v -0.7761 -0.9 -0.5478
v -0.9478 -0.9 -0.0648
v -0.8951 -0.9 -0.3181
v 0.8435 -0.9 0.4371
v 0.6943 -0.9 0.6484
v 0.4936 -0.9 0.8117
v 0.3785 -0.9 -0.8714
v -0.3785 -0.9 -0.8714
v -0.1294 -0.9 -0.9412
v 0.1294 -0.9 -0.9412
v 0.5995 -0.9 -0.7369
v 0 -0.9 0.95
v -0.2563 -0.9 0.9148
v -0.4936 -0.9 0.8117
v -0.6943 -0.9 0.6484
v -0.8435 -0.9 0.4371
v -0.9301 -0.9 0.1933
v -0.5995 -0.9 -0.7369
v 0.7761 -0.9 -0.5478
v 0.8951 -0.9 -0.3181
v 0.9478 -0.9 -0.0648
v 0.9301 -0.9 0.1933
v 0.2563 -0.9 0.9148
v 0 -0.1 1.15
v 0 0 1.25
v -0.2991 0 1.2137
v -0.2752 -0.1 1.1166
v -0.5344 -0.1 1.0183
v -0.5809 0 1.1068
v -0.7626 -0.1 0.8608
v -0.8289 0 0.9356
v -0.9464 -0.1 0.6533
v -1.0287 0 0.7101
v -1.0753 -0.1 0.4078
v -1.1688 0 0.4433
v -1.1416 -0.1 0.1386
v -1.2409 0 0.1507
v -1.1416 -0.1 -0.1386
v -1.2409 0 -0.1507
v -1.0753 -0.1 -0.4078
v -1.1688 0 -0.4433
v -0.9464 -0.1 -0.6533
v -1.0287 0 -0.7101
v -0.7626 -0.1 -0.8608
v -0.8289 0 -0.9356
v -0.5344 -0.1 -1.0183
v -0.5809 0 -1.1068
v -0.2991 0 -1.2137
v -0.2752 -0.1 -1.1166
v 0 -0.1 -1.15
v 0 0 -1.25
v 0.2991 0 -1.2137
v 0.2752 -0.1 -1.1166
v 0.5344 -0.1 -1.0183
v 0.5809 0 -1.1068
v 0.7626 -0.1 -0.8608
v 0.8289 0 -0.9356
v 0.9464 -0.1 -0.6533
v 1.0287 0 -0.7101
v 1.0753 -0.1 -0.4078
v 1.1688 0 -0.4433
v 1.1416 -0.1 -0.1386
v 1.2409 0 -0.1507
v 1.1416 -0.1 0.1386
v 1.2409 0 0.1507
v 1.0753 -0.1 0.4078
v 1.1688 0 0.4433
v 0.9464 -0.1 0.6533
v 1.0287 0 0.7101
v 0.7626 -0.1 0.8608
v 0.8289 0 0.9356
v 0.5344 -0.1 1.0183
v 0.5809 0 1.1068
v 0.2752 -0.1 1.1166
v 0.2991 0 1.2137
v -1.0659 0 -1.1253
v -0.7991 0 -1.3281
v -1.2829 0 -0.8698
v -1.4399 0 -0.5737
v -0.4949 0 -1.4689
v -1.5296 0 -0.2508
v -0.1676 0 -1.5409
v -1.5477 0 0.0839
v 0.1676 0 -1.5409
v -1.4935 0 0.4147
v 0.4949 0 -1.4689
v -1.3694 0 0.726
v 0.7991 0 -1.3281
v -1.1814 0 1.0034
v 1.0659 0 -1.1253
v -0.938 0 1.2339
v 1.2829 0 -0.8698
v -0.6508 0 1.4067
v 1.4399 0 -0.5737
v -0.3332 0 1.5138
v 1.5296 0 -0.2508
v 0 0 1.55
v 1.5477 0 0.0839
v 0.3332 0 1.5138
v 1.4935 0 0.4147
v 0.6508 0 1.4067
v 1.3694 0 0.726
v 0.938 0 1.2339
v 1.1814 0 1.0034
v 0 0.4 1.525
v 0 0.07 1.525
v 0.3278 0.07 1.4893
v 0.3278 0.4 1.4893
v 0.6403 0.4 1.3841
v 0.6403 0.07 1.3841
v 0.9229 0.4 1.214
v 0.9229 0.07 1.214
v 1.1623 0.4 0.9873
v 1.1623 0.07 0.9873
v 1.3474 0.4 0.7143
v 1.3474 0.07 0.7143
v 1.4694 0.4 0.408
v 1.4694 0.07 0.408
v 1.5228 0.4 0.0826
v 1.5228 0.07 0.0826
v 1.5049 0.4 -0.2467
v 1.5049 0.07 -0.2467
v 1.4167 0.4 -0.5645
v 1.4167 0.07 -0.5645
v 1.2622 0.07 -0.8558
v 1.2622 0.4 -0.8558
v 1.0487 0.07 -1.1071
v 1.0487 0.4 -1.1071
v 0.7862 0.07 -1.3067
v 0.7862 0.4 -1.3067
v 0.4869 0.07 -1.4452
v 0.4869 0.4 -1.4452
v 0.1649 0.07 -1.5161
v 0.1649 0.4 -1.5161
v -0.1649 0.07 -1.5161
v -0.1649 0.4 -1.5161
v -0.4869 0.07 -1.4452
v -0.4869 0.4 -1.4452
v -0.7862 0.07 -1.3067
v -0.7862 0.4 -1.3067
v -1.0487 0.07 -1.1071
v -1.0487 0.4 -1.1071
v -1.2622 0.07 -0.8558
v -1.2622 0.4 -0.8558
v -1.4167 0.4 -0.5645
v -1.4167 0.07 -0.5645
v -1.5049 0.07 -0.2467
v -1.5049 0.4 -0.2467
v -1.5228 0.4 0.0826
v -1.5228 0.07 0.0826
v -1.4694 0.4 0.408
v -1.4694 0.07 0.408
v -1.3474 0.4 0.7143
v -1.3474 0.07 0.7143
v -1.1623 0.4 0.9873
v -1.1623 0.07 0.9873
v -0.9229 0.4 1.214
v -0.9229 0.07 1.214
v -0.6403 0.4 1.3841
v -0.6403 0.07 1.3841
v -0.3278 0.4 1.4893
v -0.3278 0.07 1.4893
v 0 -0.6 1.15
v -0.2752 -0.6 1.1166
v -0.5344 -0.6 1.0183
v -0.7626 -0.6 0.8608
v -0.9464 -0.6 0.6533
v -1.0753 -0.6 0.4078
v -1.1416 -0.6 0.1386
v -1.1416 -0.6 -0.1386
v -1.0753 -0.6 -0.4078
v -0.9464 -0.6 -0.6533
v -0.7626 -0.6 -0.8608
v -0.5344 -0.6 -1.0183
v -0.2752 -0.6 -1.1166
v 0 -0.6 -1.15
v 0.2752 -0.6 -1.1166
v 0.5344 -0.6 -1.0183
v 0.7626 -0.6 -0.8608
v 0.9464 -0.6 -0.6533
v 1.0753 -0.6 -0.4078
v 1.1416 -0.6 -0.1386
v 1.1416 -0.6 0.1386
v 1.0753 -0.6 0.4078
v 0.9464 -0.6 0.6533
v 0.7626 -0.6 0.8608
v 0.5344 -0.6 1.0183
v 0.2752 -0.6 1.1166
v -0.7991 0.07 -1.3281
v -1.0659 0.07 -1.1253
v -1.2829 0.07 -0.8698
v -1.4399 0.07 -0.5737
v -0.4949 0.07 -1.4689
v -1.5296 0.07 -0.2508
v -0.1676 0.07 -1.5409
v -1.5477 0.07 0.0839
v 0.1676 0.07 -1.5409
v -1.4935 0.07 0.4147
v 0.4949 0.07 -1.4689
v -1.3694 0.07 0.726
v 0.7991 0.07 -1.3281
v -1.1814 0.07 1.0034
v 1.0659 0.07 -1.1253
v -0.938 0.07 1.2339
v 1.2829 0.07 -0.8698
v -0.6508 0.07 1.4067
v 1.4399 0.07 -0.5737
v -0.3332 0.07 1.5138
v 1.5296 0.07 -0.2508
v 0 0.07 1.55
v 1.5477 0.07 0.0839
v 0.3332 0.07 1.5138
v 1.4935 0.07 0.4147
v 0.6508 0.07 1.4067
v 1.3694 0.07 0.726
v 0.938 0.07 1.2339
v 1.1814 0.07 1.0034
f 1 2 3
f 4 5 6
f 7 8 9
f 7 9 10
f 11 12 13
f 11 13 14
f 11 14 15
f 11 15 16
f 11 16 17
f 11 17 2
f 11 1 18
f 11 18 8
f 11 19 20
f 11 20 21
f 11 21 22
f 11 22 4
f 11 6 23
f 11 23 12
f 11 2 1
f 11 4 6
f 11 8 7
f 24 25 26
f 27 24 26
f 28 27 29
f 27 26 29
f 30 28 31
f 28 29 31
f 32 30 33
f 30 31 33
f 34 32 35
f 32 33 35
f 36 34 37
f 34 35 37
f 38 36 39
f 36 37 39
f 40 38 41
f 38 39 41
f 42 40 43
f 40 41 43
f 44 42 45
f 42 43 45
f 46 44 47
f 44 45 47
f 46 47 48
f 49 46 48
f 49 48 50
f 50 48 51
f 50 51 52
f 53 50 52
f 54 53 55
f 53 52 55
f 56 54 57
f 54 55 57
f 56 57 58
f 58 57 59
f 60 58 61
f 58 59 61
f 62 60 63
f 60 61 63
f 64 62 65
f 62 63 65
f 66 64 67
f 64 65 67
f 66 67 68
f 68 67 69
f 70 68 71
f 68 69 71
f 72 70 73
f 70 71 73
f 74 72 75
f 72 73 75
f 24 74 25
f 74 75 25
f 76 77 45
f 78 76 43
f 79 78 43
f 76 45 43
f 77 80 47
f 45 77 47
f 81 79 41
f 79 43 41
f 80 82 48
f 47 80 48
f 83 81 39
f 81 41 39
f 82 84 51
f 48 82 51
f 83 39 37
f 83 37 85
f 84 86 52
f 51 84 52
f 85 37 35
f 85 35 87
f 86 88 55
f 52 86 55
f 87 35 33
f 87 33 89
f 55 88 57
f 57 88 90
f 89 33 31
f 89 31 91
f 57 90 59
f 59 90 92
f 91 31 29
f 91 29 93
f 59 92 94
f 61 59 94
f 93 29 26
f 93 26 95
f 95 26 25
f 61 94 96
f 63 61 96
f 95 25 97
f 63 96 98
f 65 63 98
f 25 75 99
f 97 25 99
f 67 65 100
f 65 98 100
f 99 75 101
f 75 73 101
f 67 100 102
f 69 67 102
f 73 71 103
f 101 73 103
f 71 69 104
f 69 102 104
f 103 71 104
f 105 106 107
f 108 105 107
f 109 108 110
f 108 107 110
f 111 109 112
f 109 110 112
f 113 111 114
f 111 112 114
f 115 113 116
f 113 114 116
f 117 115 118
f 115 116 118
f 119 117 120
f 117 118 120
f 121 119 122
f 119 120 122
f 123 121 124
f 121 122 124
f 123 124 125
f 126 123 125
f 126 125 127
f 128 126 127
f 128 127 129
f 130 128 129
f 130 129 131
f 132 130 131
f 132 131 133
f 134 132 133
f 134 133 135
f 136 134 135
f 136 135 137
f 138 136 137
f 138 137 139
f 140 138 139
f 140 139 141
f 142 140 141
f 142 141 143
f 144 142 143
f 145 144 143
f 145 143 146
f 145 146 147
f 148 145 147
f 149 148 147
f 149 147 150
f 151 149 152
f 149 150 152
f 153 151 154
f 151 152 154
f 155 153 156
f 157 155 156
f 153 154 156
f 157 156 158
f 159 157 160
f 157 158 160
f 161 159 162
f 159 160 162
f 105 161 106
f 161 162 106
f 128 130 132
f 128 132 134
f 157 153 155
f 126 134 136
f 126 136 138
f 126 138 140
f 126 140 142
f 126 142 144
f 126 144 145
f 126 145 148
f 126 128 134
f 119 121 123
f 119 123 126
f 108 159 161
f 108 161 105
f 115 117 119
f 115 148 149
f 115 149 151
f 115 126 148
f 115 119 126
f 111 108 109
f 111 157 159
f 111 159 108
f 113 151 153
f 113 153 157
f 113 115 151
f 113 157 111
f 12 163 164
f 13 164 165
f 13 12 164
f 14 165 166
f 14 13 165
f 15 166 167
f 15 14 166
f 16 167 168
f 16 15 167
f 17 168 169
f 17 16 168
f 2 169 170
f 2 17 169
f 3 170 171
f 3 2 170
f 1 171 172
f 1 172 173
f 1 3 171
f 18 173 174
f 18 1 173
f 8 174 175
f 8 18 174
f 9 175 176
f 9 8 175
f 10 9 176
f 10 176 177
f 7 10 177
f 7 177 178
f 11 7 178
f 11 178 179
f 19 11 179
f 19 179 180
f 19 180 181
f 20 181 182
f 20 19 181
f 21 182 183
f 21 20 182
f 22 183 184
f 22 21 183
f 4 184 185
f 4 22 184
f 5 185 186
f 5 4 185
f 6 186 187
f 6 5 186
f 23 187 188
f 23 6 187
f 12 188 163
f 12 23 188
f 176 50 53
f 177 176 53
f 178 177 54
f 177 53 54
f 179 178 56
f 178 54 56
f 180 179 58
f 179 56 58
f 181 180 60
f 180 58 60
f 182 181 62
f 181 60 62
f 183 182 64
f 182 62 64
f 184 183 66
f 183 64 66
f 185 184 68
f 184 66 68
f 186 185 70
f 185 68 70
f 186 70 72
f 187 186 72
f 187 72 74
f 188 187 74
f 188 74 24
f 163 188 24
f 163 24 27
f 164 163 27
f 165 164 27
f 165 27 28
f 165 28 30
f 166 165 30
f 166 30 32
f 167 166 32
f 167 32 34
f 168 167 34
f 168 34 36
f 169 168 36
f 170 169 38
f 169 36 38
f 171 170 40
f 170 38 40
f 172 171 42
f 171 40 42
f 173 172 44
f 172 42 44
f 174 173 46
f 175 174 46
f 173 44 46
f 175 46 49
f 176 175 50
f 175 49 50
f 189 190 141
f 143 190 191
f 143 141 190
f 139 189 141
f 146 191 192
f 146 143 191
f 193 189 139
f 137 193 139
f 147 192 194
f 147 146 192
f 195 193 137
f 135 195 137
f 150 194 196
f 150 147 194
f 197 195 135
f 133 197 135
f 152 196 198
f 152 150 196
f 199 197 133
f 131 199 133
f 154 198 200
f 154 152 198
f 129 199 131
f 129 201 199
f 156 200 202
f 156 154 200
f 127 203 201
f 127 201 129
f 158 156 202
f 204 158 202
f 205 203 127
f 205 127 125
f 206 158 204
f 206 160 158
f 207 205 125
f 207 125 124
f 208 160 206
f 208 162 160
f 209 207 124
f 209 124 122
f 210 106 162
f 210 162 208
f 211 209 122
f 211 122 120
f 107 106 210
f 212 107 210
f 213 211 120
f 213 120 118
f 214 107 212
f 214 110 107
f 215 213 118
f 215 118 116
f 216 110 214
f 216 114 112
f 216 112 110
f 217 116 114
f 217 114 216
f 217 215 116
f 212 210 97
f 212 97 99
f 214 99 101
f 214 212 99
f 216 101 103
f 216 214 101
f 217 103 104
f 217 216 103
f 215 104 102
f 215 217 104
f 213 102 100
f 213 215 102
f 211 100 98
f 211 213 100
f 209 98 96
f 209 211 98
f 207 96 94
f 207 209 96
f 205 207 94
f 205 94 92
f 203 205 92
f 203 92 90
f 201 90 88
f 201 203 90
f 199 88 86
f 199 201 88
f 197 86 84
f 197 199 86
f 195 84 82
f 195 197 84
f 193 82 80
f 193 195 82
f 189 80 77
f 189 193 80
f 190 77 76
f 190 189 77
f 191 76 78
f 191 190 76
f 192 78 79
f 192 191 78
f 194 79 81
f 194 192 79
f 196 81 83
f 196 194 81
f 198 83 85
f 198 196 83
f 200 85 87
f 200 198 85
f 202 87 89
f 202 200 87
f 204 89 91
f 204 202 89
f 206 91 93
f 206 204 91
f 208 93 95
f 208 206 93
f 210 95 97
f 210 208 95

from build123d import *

# Parameters (mm, degrees)
SKETCH1_R           = 1.525
BOSS_EXTRUDE1_DEPTH = 0.4
BOSS_EXTRUDE2_START = -0.33
SKETCH3_R           = 1.55
BOSS_EXTRUDE2_DEPTH = 0.07
SKETCH4_R           = 1.15
BOSS_EXTRUDE3_DEPTH = 0.9


with BuildPart() as part:
    # Sketch1 → Boss-Extrude1 (new body)
    with BuildSketch(Plane(origin=(0, 0, 0), x_dir=(1, 0, 0), z_dir=(0, 1, 0))):
        with Locations(Location((0, 0, 0), (0, 0, 270))):
            Circle(SKETCH1_R)
    extrude(amount=BOSS_EXTRUDE1_DEPTH)

    # Sketch3 → Boss-Extrude2 (add)
    with BuildSketch(Plane(origin=(0, 0.4, 0), x_dir=(1, 0, 0), z_dir=(0, 1, 0)).offset(BOSS_EXTRUDE2_START)):
        with Locations(Location((0, 0, 0), (0, 0, 270))):
            Circle(SKETCH3_R)
    extrude(amount=-BOSS_EXTRUDE2_DEPTH)

    # Sketch4 → Boss-Extrude3 (add)
    with BuildSketch(Plane.XZ):
        with Locations(Location((0, 0, 0), (0, 0, 270))):
            Circle(SKETCH4_R)
    extrude(amount=BOSS_EXTRUDE3_DEPTH)

    # Sketch5 → Cut-Revolve1 (revolve, cut)
    with BuildSketch(Plane.XY, mode=Mode.PRIVATE) as cut_revolve1_sk:
        Polygon((-1.15, -0.6), (-0.95, -0.9), (-1.15, -0.9), align=None)
    revolve(cut_revolve1_sk.sketch.rotate(Axis((0, -0.9, 0), (0, -1, 0)), 270), axis=Axis((0, -0.9, 0), (0, -1, 0)), mode=Mode.SUBTRACT)

    # Sketch7 → Revolve1 (revolve)
    with BuildSketch(Plane.XY, mode=Mode.PRIVATE) as revolve1_sk:
        Polygon((-1.15, -0.1), (-1.25, 0), (-1.15, 0), align=None)
    revolve(revolve1_sk.sketch.rotate(Axis((0, -0.9, 0), (0, -1, 0)), 270), axis=Axis((0, -0.9, 0), (0, -1, 0)))


solid = part.part
